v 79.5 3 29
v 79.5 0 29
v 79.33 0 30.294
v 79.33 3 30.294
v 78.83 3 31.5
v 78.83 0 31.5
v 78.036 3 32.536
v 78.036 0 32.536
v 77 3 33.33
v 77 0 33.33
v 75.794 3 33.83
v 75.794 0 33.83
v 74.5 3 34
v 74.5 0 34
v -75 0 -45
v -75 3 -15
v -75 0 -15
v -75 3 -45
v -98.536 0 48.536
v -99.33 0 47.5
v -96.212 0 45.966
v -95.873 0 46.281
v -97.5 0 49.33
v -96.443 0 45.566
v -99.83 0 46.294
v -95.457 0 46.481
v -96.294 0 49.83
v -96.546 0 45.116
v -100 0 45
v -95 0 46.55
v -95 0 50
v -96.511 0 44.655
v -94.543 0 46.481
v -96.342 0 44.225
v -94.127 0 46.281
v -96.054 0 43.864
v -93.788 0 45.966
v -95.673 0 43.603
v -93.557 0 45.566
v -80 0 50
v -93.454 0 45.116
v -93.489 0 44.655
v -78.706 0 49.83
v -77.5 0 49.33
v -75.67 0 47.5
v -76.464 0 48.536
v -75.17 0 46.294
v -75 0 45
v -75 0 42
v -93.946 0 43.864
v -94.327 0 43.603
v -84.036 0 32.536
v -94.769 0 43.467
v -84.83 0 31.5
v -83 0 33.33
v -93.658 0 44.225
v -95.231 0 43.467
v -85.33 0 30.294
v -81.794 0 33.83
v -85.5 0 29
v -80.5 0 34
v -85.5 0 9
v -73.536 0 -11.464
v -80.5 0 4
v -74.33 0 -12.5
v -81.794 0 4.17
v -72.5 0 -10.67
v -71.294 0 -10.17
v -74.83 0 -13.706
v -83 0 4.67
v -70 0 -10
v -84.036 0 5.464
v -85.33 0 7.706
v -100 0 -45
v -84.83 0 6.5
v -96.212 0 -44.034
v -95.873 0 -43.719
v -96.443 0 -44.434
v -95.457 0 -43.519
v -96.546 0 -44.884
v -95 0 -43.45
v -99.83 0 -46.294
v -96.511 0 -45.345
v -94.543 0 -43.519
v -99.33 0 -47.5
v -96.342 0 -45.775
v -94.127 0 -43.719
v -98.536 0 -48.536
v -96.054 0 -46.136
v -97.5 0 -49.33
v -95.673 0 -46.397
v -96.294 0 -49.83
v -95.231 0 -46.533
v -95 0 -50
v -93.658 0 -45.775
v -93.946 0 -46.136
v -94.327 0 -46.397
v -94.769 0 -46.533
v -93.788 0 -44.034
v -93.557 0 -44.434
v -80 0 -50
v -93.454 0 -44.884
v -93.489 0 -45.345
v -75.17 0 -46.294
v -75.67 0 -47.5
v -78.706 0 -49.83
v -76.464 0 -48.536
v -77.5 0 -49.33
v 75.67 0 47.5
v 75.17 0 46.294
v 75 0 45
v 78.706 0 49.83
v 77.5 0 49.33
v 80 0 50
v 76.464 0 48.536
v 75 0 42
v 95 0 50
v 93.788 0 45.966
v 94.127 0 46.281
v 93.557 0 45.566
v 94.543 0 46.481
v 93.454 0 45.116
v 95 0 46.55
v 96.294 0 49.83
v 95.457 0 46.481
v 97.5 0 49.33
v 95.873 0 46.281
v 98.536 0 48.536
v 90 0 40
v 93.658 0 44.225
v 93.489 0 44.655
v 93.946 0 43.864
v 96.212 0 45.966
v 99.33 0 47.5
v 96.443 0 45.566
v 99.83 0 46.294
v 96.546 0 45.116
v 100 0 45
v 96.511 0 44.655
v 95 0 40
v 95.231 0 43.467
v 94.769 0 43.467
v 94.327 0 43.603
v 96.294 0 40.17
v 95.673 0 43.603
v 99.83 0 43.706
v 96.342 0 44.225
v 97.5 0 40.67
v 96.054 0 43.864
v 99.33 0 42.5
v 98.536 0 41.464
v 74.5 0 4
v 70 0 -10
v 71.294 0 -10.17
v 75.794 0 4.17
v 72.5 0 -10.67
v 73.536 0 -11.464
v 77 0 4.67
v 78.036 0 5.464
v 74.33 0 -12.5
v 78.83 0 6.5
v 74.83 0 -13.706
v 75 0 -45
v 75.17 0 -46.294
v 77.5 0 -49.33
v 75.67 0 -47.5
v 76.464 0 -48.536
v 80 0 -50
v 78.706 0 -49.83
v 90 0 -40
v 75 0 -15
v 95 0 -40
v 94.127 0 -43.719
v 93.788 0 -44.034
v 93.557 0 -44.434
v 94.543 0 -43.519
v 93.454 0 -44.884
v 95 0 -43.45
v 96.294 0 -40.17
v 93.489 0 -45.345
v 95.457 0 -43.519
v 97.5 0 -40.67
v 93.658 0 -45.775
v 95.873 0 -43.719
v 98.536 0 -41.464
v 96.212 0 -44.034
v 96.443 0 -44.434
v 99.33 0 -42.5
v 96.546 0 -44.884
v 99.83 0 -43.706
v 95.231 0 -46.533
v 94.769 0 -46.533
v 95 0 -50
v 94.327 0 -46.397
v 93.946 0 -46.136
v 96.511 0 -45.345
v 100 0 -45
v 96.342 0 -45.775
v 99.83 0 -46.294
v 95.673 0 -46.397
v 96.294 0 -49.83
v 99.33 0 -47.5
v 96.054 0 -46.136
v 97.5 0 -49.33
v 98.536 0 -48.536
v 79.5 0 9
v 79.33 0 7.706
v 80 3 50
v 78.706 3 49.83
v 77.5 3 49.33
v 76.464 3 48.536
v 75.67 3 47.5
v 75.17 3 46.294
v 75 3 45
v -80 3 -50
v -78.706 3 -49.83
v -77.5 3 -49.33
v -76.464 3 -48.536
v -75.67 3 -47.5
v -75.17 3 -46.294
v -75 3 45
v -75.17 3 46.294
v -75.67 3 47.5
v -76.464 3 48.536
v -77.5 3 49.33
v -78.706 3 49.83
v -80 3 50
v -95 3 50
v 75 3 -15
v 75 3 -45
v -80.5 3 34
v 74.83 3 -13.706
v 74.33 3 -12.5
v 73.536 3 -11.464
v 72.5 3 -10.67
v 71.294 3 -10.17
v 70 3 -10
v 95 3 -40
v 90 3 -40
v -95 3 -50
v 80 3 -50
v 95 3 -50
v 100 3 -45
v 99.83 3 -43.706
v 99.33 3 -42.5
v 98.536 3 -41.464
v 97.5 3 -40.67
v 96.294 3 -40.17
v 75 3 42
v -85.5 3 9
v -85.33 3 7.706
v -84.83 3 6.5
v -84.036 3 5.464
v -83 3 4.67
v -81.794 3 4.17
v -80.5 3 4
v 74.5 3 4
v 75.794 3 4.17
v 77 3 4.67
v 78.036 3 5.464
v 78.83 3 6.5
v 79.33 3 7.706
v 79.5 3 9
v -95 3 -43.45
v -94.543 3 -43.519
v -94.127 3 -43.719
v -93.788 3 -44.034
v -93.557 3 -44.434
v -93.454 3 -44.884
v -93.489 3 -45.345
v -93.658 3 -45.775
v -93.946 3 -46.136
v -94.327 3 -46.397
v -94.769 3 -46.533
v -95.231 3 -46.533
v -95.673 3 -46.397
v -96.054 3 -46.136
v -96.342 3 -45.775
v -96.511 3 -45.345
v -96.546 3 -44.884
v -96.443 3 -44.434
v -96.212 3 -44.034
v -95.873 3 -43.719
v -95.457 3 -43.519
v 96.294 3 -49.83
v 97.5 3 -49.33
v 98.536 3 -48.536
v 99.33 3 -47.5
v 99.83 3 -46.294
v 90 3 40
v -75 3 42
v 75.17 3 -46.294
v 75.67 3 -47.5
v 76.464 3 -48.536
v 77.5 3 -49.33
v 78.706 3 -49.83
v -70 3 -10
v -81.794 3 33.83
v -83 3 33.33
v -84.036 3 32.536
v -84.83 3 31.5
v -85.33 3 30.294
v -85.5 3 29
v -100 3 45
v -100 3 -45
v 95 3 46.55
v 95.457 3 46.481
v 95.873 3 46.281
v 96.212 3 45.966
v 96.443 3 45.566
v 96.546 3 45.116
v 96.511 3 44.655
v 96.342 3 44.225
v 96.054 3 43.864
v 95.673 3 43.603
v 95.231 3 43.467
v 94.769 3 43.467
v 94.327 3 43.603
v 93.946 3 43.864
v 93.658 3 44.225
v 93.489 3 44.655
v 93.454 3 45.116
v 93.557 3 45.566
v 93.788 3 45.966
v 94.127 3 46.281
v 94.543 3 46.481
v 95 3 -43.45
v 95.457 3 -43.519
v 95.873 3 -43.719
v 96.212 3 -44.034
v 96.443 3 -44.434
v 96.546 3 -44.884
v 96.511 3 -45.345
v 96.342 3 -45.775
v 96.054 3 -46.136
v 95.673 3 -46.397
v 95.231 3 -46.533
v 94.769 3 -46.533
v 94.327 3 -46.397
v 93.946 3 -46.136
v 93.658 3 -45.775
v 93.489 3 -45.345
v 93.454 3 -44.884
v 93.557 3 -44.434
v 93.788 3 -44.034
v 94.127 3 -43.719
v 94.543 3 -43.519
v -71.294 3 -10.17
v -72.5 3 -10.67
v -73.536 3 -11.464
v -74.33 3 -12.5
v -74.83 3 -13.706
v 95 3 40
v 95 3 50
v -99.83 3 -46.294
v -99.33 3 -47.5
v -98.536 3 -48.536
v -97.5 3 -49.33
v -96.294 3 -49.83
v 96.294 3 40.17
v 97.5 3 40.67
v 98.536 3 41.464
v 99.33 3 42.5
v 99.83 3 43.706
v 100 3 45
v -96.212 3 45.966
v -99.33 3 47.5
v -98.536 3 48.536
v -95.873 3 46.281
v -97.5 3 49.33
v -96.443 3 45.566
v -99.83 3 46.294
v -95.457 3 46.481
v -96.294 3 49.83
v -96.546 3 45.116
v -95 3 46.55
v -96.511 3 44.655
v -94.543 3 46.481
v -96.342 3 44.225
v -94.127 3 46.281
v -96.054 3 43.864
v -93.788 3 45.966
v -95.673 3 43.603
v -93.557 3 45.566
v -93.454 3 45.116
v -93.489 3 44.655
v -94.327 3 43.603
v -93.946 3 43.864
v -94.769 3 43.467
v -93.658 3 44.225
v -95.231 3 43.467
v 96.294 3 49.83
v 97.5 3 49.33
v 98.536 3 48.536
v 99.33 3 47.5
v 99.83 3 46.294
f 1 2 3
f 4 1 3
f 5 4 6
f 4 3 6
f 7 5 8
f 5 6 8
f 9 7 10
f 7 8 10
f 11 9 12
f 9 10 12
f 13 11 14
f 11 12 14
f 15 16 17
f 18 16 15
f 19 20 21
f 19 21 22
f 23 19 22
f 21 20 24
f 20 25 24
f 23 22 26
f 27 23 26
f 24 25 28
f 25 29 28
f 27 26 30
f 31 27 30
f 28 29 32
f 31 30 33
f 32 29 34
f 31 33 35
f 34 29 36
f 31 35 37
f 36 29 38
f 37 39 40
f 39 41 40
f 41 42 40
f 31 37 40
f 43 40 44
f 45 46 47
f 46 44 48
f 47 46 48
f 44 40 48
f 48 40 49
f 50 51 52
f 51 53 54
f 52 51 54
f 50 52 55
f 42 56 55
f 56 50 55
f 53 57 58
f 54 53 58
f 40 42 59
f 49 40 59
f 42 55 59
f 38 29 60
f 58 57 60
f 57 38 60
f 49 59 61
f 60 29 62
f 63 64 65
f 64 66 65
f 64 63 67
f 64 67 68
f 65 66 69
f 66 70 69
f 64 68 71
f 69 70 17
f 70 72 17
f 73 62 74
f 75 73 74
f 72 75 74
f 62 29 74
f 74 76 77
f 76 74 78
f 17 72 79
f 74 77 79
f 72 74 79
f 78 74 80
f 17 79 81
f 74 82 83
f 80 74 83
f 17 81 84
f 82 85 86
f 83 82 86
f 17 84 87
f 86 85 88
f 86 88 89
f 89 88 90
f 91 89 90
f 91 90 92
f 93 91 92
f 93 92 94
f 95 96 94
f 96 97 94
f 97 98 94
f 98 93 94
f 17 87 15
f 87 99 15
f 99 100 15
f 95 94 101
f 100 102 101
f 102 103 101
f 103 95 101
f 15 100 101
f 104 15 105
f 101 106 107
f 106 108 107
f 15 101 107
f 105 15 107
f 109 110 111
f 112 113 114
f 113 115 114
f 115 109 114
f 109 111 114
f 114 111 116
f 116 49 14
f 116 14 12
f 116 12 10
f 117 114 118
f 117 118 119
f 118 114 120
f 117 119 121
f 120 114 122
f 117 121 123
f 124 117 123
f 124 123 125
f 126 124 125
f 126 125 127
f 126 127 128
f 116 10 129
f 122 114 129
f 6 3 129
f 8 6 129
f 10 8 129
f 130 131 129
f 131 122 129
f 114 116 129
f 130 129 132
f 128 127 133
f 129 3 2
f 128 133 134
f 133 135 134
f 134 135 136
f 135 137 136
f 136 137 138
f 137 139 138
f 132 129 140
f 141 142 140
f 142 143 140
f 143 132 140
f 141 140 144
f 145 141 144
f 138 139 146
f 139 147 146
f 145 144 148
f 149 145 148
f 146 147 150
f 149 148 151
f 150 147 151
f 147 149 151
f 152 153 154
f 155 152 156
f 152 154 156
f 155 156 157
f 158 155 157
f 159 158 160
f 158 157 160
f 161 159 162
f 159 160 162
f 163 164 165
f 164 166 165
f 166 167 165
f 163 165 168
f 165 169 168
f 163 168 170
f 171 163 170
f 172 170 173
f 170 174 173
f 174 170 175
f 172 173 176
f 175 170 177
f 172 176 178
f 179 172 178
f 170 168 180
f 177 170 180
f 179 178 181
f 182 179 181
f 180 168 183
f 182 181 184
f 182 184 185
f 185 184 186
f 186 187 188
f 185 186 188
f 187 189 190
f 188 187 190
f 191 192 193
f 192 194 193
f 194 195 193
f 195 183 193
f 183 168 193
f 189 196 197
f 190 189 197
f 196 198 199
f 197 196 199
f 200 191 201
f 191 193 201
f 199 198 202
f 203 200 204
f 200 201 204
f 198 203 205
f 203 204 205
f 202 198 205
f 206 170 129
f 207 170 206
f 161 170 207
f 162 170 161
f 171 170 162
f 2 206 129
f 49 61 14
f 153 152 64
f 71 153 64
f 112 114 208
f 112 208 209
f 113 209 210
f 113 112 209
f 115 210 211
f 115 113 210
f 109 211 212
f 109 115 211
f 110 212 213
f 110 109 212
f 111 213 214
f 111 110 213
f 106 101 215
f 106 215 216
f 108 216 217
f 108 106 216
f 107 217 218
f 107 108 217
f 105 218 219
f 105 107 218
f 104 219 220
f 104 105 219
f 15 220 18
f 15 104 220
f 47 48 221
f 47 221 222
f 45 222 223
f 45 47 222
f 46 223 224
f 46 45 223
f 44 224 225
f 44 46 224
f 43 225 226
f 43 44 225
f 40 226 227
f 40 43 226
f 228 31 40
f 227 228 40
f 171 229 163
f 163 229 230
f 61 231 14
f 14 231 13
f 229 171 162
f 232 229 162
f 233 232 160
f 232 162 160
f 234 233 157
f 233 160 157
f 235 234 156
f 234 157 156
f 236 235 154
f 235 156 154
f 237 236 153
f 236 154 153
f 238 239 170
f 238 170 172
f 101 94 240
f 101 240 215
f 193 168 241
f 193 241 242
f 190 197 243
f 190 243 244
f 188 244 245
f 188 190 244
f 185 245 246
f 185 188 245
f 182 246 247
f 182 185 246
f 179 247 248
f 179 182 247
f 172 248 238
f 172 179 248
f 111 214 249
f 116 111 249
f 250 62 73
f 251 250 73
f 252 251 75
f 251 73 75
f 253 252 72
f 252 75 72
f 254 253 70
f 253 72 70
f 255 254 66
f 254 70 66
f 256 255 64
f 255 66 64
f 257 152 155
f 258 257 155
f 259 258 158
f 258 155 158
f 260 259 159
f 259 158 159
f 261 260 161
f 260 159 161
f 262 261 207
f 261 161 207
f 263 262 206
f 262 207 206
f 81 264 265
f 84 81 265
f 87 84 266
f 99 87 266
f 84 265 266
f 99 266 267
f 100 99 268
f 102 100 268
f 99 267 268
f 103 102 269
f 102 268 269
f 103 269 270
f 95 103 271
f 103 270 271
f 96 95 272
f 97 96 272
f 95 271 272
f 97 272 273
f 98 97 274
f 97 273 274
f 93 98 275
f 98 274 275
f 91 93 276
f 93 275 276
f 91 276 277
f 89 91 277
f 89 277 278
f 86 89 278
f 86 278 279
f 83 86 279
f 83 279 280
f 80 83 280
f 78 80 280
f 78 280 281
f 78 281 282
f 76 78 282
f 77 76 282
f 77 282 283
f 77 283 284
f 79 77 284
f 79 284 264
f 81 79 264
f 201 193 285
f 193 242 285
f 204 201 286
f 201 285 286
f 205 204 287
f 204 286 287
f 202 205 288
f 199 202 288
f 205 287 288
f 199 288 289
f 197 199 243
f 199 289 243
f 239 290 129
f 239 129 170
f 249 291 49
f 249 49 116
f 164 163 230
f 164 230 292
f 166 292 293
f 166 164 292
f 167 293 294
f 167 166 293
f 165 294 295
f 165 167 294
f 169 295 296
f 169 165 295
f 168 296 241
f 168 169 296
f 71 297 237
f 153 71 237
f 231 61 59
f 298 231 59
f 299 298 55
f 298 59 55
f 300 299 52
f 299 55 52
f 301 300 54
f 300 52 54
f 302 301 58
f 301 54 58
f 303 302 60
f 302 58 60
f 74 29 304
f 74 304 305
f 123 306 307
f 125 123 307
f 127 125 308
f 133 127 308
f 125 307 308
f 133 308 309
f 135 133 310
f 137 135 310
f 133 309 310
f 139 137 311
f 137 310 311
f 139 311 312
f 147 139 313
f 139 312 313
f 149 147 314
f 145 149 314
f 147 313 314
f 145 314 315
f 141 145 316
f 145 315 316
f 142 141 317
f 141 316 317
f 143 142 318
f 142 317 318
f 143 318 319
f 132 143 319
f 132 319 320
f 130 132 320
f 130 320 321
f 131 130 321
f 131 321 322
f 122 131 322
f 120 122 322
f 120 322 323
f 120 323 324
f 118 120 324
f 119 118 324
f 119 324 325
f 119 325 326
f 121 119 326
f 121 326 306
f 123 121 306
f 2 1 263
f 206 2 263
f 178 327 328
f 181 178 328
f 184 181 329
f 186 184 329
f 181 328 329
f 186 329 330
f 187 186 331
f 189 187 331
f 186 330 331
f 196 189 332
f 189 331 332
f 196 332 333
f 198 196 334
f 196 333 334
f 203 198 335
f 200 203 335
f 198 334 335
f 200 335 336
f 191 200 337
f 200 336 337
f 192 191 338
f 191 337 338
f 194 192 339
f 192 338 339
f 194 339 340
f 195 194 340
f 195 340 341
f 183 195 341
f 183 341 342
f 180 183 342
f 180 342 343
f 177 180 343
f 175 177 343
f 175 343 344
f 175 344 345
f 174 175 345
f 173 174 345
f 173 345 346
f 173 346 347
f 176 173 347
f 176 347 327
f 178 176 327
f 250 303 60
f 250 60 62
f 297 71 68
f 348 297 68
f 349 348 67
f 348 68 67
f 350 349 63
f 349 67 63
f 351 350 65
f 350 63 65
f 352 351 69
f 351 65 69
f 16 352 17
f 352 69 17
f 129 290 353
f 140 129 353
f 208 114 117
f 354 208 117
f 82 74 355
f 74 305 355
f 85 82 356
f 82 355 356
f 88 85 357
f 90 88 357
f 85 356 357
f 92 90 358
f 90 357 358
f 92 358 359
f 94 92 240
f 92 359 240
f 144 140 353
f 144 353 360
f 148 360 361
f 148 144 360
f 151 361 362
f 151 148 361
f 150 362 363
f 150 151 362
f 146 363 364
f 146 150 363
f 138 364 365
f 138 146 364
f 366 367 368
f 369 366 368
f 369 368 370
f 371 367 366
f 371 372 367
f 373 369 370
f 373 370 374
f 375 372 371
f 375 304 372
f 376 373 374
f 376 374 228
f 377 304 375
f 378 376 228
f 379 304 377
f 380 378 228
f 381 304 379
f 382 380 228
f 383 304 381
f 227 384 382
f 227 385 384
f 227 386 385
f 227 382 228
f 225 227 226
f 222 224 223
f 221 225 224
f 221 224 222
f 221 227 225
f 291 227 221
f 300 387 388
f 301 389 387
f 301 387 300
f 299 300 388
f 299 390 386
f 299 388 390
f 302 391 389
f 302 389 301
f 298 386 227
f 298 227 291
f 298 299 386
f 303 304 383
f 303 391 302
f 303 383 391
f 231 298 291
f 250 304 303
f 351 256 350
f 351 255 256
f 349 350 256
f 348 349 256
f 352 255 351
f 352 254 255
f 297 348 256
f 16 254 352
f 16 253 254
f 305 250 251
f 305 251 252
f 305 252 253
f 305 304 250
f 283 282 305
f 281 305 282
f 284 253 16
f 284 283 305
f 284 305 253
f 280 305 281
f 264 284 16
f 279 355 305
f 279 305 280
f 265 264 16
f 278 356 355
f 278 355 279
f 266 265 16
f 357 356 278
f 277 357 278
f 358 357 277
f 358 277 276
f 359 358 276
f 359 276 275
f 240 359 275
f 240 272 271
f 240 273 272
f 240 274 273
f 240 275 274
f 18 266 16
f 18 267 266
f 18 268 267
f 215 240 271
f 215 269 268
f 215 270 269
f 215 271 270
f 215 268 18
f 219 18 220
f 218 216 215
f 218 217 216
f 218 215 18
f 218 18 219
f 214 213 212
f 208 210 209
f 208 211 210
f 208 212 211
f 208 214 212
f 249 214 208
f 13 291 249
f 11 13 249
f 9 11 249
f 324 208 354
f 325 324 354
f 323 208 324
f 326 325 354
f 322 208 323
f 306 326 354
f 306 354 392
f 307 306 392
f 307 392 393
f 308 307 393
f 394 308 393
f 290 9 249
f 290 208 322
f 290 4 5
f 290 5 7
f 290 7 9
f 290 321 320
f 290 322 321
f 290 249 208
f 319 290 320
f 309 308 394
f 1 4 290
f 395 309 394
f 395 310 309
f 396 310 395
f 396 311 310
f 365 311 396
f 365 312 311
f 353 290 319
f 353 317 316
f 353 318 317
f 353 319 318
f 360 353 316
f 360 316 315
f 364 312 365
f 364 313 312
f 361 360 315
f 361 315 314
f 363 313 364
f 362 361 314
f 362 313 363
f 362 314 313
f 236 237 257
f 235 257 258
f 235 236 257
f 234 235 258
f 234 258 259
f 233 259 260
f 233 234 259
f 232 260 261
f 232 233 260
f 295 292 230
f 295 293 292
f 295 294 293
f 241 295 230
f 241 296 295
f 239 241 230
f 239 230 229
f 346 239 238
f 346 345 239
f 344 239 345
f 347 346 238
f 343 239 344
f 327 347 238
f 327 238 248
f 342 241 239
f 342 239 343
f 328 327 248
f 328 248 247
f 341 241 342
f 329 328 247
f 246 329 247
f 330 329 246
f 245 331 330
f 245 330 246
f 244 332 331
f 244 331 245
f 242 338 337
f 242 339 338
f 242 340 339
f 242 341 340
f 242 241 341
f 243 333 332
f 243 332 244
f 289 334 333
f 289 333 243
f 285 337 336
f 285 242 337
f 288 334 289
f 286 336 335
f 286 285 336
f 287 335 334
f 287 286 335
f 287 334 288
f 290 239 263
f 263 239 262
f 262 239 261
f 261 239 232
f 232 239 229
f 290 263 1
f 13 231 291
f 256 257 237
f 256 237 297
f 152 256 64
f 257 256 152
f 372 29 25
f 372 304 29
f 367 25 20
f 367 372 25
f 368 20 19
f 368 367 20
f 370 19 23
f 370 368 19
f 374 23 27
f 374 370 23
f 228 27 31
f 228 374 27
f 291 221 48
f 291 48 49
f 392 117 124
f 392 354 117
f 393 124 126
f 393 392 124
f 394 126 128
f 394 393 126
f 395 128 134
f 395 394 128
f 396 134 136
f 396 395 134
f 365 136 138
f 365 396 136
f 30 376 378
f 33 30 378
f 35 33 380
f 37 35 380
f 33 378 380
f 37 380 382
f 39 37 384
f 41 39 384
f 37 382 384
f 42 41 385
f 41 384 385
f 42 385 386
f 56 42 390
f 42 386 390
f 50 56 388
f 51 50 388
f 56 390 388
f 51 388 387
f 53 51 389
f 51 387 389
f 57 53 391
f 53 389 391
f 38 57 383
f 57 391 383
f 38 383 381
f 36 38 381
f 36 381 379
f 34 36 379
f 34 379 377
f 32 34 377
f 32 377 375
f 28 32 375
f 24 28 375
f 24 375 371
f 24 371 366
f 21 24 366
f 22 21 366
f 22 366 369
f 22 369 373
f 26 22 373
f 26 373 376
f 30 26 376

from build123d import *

# Parameters (mm, degrees)
SKETCH1_W           = 200
SKETCH1_H           = 100
BOSS_EXTRUDE1_DEPTH = 3
SKETCH2_R           = 1.55
CUT_EXTRUDE1_DEPTH  = 112.843640856
FILLET1_R           = 5
SKETCH3_W           = 150
SKETCH3_H           = 40
SKETCH3_W_2         = 10
SKETCH3_H_2         = 80
SKETCH3_H_3         = 8
SKETCH3_W_3         = 165
SKETCH3_H_4         = 30
CUT_EXTRUDE2_DEPTH  = 112.843640856
FILLET2_START       = -1
FILLET2_DEPTH       = 5
FILLET2_2_DEPTH     = 3


with BuildPart() as part:
    # Sketch1 → Boss-Extrude1 (new body)
    with BuildSketch(Plane(origin=(0, 0, 0), x_dir=(1, 0, 0), z_dir=(0, 1, 0))):
        Rectangle(SKETCH1_W, SKETCH1_H)
    extrude(amount=BOSS_EXTRUDE1_DEPTH)

    # Sketch2 → Cut-Extrude1 (cut, through all)
    with BuildSketch(Plane(origin=(0, 3, 0), x_dir=(1, 0, 0), z_dir=(0, 1, 0))):
        with Locations(Location((-95, 45, 0), (0, 0, 270))):
            Circle(SKETCH2_R)
        with Locations(Location((-95, -45, 0), (0, 0, 270))):
            Circle(SKETCH2_R)
        with Locations(Location((95, 45, 0), (0, 0, 270))):
            Circle(SKETCH2_R)
        with Locations(Location((95, -45, 0), (0, 0, 270))):
            Circle(SKETCH2_R)
    extrude(amount=-CUT_EXTRUDE1_DEPTH, mode=Mode.SUBTRACT)

    # Fillet1
    fillet1_edges = [part.edges().sort_by_distance(p)[0] for p in [
        (-100, 1.5, -50),
        (100, 1.5, -50),
        (100, 1.5, 50),
        (-100, 1.5, 50),
    ]]
    fillet(fillet1_edges, radius=FILLET1_R)

    # Sketch3 → Cut-Extrude2 (cut, through all)
    with BuildSketch(Plane(origin=(0, 3, 0), x_dir=(1, 0, 0), z_dir=(0, 1, 0))):
        with Locations((0, 30)):
            Rectangle(SKETCH3_W, SKETCH3_H)
        with Locations((95, 0)):
            Rectangle(SKETCH3_W_2, SKETCH3_H_2)
        with Locations((0, -46)):
            Rectangle(SKETCH3_W, SKETCH3_H_3)
        with Locations((-3, -19)):
            Rectangle(SKETCH3_W_3, SKETCH3_H_4)
    extrude(amount=-CUT_EXTRUDE2_DEPTH, mode=Mode.SUBTRACT)

    # Fillet2: read off the stored shape, not the designer's step
    # Fillet2 outline → Fillet2 (cut)
    with BuildSketch(Plane(origin=(0, 0, 0), x_dir=(1, 0, 0), z_dir=(0, 1, 0)).offset(FILLET2_START)):
        with BuildLine():
            Line((100, 40), (100, 45))
            ThreePointArc((100, 45), (98.535533906, 41.464466094), (95, 40))
            Line((95, 40), (100, 40))
        make_face()
        with BuildLine():
            ThreePointArc((-80, 50), (-76.464466094, 48.535533906), (-75, 45))
            Line((-75, 45), (-75, 50))
            Line((-75, 50), (-80, 50))
        make_face()
        with BuildLine():
            ThreePointArc((75, 45), (76.464466094, 48.535533906), (80, 50))
            Line((80, 50), (75, 50))
            Line((75, 50), (75, 45))
        make_face()
        with BuildLine():
            Line((100, -40), (95, -40))
            ThreePointArc((95, -40), (98.535533906, -41.464466094), (100, -45))
            Line((100, -45), (100, -40))
        make_face()
        with BuildLine():
            Line((75, -50), (80, -50))
            ThreePointArc((80, -50), (76.464466094, -48.535533906), (75, -45))
            Line((75, -45), (75, -50))
        make_face()
        with BuildLine():
            ThreePointArc((-75, -45), (-76.464466094, -48.535533906), (-80, -50))
            Line((-80, -50), (-75, -50))
            Line((-75, -50), (-75, -45))
        make_face()
    extrude(amount=FILLET2_DEPTH, mode=Mode.SUBTRACT)

    # Fillet2 2 outline → Fillet2 2 (add)
    with BuildSketch(Plane(origin=(0, 0, 0), x_dir=(1, 0, 0), z_dir=(0, 1, 0))):
        with BuildLine():
            Line((-75, 10), (-70, 10))
            ThreePointArc((-70, 10), (-73.535533906, 11.464466094), (-75, 15))
            Line((-75, 15), (-75, 10))
        make_face()
        with BuildLine():
            Line((75, 10), (75, 15))
            ThreePointArc((75, 15), (73.535533906, 11.464466094), (70, 10))
            Line((70, 10), (75, 10))
        make_face()
        with BuildLine():
            Line((79.5, -34), (79.5, -29))
            ThreePointArc((79.5, -29), (78.035533906, -32.535533906), (74.5, -34))
            Line((74.5, -34), (79.5, -34))
        make_face()
        with BuildLine():
            ThreePointArc((74.5, -4), (78.035533906, -5.464466094), (79.5, -9))
            Line((79.5, -9), (79.5, -4))
            Line((79.5, -4), (74.5, -4))
        make_face()
        with BuildLine():
            Line((-85.5, -34), (-80.5, -34))
            ThreePointArc((-80.5, -34), (-84.035533906, -32.535533906), (-85.5, -29))
            Line((-85.5, -29), (-85.5, -34))
        make_face()
        with BuildLine():
            ThreePointArc((-85.5, -9), (-84.035533906, -5.464466094), (-80.5, -4))
            Line((-80.5, -4), (-85.5, -4))
            Line((-85.5, -4), (-85.5, -9))
        make_face()
    extrude(amount=FILLET2_2_DEPTH)


solid = part.part
